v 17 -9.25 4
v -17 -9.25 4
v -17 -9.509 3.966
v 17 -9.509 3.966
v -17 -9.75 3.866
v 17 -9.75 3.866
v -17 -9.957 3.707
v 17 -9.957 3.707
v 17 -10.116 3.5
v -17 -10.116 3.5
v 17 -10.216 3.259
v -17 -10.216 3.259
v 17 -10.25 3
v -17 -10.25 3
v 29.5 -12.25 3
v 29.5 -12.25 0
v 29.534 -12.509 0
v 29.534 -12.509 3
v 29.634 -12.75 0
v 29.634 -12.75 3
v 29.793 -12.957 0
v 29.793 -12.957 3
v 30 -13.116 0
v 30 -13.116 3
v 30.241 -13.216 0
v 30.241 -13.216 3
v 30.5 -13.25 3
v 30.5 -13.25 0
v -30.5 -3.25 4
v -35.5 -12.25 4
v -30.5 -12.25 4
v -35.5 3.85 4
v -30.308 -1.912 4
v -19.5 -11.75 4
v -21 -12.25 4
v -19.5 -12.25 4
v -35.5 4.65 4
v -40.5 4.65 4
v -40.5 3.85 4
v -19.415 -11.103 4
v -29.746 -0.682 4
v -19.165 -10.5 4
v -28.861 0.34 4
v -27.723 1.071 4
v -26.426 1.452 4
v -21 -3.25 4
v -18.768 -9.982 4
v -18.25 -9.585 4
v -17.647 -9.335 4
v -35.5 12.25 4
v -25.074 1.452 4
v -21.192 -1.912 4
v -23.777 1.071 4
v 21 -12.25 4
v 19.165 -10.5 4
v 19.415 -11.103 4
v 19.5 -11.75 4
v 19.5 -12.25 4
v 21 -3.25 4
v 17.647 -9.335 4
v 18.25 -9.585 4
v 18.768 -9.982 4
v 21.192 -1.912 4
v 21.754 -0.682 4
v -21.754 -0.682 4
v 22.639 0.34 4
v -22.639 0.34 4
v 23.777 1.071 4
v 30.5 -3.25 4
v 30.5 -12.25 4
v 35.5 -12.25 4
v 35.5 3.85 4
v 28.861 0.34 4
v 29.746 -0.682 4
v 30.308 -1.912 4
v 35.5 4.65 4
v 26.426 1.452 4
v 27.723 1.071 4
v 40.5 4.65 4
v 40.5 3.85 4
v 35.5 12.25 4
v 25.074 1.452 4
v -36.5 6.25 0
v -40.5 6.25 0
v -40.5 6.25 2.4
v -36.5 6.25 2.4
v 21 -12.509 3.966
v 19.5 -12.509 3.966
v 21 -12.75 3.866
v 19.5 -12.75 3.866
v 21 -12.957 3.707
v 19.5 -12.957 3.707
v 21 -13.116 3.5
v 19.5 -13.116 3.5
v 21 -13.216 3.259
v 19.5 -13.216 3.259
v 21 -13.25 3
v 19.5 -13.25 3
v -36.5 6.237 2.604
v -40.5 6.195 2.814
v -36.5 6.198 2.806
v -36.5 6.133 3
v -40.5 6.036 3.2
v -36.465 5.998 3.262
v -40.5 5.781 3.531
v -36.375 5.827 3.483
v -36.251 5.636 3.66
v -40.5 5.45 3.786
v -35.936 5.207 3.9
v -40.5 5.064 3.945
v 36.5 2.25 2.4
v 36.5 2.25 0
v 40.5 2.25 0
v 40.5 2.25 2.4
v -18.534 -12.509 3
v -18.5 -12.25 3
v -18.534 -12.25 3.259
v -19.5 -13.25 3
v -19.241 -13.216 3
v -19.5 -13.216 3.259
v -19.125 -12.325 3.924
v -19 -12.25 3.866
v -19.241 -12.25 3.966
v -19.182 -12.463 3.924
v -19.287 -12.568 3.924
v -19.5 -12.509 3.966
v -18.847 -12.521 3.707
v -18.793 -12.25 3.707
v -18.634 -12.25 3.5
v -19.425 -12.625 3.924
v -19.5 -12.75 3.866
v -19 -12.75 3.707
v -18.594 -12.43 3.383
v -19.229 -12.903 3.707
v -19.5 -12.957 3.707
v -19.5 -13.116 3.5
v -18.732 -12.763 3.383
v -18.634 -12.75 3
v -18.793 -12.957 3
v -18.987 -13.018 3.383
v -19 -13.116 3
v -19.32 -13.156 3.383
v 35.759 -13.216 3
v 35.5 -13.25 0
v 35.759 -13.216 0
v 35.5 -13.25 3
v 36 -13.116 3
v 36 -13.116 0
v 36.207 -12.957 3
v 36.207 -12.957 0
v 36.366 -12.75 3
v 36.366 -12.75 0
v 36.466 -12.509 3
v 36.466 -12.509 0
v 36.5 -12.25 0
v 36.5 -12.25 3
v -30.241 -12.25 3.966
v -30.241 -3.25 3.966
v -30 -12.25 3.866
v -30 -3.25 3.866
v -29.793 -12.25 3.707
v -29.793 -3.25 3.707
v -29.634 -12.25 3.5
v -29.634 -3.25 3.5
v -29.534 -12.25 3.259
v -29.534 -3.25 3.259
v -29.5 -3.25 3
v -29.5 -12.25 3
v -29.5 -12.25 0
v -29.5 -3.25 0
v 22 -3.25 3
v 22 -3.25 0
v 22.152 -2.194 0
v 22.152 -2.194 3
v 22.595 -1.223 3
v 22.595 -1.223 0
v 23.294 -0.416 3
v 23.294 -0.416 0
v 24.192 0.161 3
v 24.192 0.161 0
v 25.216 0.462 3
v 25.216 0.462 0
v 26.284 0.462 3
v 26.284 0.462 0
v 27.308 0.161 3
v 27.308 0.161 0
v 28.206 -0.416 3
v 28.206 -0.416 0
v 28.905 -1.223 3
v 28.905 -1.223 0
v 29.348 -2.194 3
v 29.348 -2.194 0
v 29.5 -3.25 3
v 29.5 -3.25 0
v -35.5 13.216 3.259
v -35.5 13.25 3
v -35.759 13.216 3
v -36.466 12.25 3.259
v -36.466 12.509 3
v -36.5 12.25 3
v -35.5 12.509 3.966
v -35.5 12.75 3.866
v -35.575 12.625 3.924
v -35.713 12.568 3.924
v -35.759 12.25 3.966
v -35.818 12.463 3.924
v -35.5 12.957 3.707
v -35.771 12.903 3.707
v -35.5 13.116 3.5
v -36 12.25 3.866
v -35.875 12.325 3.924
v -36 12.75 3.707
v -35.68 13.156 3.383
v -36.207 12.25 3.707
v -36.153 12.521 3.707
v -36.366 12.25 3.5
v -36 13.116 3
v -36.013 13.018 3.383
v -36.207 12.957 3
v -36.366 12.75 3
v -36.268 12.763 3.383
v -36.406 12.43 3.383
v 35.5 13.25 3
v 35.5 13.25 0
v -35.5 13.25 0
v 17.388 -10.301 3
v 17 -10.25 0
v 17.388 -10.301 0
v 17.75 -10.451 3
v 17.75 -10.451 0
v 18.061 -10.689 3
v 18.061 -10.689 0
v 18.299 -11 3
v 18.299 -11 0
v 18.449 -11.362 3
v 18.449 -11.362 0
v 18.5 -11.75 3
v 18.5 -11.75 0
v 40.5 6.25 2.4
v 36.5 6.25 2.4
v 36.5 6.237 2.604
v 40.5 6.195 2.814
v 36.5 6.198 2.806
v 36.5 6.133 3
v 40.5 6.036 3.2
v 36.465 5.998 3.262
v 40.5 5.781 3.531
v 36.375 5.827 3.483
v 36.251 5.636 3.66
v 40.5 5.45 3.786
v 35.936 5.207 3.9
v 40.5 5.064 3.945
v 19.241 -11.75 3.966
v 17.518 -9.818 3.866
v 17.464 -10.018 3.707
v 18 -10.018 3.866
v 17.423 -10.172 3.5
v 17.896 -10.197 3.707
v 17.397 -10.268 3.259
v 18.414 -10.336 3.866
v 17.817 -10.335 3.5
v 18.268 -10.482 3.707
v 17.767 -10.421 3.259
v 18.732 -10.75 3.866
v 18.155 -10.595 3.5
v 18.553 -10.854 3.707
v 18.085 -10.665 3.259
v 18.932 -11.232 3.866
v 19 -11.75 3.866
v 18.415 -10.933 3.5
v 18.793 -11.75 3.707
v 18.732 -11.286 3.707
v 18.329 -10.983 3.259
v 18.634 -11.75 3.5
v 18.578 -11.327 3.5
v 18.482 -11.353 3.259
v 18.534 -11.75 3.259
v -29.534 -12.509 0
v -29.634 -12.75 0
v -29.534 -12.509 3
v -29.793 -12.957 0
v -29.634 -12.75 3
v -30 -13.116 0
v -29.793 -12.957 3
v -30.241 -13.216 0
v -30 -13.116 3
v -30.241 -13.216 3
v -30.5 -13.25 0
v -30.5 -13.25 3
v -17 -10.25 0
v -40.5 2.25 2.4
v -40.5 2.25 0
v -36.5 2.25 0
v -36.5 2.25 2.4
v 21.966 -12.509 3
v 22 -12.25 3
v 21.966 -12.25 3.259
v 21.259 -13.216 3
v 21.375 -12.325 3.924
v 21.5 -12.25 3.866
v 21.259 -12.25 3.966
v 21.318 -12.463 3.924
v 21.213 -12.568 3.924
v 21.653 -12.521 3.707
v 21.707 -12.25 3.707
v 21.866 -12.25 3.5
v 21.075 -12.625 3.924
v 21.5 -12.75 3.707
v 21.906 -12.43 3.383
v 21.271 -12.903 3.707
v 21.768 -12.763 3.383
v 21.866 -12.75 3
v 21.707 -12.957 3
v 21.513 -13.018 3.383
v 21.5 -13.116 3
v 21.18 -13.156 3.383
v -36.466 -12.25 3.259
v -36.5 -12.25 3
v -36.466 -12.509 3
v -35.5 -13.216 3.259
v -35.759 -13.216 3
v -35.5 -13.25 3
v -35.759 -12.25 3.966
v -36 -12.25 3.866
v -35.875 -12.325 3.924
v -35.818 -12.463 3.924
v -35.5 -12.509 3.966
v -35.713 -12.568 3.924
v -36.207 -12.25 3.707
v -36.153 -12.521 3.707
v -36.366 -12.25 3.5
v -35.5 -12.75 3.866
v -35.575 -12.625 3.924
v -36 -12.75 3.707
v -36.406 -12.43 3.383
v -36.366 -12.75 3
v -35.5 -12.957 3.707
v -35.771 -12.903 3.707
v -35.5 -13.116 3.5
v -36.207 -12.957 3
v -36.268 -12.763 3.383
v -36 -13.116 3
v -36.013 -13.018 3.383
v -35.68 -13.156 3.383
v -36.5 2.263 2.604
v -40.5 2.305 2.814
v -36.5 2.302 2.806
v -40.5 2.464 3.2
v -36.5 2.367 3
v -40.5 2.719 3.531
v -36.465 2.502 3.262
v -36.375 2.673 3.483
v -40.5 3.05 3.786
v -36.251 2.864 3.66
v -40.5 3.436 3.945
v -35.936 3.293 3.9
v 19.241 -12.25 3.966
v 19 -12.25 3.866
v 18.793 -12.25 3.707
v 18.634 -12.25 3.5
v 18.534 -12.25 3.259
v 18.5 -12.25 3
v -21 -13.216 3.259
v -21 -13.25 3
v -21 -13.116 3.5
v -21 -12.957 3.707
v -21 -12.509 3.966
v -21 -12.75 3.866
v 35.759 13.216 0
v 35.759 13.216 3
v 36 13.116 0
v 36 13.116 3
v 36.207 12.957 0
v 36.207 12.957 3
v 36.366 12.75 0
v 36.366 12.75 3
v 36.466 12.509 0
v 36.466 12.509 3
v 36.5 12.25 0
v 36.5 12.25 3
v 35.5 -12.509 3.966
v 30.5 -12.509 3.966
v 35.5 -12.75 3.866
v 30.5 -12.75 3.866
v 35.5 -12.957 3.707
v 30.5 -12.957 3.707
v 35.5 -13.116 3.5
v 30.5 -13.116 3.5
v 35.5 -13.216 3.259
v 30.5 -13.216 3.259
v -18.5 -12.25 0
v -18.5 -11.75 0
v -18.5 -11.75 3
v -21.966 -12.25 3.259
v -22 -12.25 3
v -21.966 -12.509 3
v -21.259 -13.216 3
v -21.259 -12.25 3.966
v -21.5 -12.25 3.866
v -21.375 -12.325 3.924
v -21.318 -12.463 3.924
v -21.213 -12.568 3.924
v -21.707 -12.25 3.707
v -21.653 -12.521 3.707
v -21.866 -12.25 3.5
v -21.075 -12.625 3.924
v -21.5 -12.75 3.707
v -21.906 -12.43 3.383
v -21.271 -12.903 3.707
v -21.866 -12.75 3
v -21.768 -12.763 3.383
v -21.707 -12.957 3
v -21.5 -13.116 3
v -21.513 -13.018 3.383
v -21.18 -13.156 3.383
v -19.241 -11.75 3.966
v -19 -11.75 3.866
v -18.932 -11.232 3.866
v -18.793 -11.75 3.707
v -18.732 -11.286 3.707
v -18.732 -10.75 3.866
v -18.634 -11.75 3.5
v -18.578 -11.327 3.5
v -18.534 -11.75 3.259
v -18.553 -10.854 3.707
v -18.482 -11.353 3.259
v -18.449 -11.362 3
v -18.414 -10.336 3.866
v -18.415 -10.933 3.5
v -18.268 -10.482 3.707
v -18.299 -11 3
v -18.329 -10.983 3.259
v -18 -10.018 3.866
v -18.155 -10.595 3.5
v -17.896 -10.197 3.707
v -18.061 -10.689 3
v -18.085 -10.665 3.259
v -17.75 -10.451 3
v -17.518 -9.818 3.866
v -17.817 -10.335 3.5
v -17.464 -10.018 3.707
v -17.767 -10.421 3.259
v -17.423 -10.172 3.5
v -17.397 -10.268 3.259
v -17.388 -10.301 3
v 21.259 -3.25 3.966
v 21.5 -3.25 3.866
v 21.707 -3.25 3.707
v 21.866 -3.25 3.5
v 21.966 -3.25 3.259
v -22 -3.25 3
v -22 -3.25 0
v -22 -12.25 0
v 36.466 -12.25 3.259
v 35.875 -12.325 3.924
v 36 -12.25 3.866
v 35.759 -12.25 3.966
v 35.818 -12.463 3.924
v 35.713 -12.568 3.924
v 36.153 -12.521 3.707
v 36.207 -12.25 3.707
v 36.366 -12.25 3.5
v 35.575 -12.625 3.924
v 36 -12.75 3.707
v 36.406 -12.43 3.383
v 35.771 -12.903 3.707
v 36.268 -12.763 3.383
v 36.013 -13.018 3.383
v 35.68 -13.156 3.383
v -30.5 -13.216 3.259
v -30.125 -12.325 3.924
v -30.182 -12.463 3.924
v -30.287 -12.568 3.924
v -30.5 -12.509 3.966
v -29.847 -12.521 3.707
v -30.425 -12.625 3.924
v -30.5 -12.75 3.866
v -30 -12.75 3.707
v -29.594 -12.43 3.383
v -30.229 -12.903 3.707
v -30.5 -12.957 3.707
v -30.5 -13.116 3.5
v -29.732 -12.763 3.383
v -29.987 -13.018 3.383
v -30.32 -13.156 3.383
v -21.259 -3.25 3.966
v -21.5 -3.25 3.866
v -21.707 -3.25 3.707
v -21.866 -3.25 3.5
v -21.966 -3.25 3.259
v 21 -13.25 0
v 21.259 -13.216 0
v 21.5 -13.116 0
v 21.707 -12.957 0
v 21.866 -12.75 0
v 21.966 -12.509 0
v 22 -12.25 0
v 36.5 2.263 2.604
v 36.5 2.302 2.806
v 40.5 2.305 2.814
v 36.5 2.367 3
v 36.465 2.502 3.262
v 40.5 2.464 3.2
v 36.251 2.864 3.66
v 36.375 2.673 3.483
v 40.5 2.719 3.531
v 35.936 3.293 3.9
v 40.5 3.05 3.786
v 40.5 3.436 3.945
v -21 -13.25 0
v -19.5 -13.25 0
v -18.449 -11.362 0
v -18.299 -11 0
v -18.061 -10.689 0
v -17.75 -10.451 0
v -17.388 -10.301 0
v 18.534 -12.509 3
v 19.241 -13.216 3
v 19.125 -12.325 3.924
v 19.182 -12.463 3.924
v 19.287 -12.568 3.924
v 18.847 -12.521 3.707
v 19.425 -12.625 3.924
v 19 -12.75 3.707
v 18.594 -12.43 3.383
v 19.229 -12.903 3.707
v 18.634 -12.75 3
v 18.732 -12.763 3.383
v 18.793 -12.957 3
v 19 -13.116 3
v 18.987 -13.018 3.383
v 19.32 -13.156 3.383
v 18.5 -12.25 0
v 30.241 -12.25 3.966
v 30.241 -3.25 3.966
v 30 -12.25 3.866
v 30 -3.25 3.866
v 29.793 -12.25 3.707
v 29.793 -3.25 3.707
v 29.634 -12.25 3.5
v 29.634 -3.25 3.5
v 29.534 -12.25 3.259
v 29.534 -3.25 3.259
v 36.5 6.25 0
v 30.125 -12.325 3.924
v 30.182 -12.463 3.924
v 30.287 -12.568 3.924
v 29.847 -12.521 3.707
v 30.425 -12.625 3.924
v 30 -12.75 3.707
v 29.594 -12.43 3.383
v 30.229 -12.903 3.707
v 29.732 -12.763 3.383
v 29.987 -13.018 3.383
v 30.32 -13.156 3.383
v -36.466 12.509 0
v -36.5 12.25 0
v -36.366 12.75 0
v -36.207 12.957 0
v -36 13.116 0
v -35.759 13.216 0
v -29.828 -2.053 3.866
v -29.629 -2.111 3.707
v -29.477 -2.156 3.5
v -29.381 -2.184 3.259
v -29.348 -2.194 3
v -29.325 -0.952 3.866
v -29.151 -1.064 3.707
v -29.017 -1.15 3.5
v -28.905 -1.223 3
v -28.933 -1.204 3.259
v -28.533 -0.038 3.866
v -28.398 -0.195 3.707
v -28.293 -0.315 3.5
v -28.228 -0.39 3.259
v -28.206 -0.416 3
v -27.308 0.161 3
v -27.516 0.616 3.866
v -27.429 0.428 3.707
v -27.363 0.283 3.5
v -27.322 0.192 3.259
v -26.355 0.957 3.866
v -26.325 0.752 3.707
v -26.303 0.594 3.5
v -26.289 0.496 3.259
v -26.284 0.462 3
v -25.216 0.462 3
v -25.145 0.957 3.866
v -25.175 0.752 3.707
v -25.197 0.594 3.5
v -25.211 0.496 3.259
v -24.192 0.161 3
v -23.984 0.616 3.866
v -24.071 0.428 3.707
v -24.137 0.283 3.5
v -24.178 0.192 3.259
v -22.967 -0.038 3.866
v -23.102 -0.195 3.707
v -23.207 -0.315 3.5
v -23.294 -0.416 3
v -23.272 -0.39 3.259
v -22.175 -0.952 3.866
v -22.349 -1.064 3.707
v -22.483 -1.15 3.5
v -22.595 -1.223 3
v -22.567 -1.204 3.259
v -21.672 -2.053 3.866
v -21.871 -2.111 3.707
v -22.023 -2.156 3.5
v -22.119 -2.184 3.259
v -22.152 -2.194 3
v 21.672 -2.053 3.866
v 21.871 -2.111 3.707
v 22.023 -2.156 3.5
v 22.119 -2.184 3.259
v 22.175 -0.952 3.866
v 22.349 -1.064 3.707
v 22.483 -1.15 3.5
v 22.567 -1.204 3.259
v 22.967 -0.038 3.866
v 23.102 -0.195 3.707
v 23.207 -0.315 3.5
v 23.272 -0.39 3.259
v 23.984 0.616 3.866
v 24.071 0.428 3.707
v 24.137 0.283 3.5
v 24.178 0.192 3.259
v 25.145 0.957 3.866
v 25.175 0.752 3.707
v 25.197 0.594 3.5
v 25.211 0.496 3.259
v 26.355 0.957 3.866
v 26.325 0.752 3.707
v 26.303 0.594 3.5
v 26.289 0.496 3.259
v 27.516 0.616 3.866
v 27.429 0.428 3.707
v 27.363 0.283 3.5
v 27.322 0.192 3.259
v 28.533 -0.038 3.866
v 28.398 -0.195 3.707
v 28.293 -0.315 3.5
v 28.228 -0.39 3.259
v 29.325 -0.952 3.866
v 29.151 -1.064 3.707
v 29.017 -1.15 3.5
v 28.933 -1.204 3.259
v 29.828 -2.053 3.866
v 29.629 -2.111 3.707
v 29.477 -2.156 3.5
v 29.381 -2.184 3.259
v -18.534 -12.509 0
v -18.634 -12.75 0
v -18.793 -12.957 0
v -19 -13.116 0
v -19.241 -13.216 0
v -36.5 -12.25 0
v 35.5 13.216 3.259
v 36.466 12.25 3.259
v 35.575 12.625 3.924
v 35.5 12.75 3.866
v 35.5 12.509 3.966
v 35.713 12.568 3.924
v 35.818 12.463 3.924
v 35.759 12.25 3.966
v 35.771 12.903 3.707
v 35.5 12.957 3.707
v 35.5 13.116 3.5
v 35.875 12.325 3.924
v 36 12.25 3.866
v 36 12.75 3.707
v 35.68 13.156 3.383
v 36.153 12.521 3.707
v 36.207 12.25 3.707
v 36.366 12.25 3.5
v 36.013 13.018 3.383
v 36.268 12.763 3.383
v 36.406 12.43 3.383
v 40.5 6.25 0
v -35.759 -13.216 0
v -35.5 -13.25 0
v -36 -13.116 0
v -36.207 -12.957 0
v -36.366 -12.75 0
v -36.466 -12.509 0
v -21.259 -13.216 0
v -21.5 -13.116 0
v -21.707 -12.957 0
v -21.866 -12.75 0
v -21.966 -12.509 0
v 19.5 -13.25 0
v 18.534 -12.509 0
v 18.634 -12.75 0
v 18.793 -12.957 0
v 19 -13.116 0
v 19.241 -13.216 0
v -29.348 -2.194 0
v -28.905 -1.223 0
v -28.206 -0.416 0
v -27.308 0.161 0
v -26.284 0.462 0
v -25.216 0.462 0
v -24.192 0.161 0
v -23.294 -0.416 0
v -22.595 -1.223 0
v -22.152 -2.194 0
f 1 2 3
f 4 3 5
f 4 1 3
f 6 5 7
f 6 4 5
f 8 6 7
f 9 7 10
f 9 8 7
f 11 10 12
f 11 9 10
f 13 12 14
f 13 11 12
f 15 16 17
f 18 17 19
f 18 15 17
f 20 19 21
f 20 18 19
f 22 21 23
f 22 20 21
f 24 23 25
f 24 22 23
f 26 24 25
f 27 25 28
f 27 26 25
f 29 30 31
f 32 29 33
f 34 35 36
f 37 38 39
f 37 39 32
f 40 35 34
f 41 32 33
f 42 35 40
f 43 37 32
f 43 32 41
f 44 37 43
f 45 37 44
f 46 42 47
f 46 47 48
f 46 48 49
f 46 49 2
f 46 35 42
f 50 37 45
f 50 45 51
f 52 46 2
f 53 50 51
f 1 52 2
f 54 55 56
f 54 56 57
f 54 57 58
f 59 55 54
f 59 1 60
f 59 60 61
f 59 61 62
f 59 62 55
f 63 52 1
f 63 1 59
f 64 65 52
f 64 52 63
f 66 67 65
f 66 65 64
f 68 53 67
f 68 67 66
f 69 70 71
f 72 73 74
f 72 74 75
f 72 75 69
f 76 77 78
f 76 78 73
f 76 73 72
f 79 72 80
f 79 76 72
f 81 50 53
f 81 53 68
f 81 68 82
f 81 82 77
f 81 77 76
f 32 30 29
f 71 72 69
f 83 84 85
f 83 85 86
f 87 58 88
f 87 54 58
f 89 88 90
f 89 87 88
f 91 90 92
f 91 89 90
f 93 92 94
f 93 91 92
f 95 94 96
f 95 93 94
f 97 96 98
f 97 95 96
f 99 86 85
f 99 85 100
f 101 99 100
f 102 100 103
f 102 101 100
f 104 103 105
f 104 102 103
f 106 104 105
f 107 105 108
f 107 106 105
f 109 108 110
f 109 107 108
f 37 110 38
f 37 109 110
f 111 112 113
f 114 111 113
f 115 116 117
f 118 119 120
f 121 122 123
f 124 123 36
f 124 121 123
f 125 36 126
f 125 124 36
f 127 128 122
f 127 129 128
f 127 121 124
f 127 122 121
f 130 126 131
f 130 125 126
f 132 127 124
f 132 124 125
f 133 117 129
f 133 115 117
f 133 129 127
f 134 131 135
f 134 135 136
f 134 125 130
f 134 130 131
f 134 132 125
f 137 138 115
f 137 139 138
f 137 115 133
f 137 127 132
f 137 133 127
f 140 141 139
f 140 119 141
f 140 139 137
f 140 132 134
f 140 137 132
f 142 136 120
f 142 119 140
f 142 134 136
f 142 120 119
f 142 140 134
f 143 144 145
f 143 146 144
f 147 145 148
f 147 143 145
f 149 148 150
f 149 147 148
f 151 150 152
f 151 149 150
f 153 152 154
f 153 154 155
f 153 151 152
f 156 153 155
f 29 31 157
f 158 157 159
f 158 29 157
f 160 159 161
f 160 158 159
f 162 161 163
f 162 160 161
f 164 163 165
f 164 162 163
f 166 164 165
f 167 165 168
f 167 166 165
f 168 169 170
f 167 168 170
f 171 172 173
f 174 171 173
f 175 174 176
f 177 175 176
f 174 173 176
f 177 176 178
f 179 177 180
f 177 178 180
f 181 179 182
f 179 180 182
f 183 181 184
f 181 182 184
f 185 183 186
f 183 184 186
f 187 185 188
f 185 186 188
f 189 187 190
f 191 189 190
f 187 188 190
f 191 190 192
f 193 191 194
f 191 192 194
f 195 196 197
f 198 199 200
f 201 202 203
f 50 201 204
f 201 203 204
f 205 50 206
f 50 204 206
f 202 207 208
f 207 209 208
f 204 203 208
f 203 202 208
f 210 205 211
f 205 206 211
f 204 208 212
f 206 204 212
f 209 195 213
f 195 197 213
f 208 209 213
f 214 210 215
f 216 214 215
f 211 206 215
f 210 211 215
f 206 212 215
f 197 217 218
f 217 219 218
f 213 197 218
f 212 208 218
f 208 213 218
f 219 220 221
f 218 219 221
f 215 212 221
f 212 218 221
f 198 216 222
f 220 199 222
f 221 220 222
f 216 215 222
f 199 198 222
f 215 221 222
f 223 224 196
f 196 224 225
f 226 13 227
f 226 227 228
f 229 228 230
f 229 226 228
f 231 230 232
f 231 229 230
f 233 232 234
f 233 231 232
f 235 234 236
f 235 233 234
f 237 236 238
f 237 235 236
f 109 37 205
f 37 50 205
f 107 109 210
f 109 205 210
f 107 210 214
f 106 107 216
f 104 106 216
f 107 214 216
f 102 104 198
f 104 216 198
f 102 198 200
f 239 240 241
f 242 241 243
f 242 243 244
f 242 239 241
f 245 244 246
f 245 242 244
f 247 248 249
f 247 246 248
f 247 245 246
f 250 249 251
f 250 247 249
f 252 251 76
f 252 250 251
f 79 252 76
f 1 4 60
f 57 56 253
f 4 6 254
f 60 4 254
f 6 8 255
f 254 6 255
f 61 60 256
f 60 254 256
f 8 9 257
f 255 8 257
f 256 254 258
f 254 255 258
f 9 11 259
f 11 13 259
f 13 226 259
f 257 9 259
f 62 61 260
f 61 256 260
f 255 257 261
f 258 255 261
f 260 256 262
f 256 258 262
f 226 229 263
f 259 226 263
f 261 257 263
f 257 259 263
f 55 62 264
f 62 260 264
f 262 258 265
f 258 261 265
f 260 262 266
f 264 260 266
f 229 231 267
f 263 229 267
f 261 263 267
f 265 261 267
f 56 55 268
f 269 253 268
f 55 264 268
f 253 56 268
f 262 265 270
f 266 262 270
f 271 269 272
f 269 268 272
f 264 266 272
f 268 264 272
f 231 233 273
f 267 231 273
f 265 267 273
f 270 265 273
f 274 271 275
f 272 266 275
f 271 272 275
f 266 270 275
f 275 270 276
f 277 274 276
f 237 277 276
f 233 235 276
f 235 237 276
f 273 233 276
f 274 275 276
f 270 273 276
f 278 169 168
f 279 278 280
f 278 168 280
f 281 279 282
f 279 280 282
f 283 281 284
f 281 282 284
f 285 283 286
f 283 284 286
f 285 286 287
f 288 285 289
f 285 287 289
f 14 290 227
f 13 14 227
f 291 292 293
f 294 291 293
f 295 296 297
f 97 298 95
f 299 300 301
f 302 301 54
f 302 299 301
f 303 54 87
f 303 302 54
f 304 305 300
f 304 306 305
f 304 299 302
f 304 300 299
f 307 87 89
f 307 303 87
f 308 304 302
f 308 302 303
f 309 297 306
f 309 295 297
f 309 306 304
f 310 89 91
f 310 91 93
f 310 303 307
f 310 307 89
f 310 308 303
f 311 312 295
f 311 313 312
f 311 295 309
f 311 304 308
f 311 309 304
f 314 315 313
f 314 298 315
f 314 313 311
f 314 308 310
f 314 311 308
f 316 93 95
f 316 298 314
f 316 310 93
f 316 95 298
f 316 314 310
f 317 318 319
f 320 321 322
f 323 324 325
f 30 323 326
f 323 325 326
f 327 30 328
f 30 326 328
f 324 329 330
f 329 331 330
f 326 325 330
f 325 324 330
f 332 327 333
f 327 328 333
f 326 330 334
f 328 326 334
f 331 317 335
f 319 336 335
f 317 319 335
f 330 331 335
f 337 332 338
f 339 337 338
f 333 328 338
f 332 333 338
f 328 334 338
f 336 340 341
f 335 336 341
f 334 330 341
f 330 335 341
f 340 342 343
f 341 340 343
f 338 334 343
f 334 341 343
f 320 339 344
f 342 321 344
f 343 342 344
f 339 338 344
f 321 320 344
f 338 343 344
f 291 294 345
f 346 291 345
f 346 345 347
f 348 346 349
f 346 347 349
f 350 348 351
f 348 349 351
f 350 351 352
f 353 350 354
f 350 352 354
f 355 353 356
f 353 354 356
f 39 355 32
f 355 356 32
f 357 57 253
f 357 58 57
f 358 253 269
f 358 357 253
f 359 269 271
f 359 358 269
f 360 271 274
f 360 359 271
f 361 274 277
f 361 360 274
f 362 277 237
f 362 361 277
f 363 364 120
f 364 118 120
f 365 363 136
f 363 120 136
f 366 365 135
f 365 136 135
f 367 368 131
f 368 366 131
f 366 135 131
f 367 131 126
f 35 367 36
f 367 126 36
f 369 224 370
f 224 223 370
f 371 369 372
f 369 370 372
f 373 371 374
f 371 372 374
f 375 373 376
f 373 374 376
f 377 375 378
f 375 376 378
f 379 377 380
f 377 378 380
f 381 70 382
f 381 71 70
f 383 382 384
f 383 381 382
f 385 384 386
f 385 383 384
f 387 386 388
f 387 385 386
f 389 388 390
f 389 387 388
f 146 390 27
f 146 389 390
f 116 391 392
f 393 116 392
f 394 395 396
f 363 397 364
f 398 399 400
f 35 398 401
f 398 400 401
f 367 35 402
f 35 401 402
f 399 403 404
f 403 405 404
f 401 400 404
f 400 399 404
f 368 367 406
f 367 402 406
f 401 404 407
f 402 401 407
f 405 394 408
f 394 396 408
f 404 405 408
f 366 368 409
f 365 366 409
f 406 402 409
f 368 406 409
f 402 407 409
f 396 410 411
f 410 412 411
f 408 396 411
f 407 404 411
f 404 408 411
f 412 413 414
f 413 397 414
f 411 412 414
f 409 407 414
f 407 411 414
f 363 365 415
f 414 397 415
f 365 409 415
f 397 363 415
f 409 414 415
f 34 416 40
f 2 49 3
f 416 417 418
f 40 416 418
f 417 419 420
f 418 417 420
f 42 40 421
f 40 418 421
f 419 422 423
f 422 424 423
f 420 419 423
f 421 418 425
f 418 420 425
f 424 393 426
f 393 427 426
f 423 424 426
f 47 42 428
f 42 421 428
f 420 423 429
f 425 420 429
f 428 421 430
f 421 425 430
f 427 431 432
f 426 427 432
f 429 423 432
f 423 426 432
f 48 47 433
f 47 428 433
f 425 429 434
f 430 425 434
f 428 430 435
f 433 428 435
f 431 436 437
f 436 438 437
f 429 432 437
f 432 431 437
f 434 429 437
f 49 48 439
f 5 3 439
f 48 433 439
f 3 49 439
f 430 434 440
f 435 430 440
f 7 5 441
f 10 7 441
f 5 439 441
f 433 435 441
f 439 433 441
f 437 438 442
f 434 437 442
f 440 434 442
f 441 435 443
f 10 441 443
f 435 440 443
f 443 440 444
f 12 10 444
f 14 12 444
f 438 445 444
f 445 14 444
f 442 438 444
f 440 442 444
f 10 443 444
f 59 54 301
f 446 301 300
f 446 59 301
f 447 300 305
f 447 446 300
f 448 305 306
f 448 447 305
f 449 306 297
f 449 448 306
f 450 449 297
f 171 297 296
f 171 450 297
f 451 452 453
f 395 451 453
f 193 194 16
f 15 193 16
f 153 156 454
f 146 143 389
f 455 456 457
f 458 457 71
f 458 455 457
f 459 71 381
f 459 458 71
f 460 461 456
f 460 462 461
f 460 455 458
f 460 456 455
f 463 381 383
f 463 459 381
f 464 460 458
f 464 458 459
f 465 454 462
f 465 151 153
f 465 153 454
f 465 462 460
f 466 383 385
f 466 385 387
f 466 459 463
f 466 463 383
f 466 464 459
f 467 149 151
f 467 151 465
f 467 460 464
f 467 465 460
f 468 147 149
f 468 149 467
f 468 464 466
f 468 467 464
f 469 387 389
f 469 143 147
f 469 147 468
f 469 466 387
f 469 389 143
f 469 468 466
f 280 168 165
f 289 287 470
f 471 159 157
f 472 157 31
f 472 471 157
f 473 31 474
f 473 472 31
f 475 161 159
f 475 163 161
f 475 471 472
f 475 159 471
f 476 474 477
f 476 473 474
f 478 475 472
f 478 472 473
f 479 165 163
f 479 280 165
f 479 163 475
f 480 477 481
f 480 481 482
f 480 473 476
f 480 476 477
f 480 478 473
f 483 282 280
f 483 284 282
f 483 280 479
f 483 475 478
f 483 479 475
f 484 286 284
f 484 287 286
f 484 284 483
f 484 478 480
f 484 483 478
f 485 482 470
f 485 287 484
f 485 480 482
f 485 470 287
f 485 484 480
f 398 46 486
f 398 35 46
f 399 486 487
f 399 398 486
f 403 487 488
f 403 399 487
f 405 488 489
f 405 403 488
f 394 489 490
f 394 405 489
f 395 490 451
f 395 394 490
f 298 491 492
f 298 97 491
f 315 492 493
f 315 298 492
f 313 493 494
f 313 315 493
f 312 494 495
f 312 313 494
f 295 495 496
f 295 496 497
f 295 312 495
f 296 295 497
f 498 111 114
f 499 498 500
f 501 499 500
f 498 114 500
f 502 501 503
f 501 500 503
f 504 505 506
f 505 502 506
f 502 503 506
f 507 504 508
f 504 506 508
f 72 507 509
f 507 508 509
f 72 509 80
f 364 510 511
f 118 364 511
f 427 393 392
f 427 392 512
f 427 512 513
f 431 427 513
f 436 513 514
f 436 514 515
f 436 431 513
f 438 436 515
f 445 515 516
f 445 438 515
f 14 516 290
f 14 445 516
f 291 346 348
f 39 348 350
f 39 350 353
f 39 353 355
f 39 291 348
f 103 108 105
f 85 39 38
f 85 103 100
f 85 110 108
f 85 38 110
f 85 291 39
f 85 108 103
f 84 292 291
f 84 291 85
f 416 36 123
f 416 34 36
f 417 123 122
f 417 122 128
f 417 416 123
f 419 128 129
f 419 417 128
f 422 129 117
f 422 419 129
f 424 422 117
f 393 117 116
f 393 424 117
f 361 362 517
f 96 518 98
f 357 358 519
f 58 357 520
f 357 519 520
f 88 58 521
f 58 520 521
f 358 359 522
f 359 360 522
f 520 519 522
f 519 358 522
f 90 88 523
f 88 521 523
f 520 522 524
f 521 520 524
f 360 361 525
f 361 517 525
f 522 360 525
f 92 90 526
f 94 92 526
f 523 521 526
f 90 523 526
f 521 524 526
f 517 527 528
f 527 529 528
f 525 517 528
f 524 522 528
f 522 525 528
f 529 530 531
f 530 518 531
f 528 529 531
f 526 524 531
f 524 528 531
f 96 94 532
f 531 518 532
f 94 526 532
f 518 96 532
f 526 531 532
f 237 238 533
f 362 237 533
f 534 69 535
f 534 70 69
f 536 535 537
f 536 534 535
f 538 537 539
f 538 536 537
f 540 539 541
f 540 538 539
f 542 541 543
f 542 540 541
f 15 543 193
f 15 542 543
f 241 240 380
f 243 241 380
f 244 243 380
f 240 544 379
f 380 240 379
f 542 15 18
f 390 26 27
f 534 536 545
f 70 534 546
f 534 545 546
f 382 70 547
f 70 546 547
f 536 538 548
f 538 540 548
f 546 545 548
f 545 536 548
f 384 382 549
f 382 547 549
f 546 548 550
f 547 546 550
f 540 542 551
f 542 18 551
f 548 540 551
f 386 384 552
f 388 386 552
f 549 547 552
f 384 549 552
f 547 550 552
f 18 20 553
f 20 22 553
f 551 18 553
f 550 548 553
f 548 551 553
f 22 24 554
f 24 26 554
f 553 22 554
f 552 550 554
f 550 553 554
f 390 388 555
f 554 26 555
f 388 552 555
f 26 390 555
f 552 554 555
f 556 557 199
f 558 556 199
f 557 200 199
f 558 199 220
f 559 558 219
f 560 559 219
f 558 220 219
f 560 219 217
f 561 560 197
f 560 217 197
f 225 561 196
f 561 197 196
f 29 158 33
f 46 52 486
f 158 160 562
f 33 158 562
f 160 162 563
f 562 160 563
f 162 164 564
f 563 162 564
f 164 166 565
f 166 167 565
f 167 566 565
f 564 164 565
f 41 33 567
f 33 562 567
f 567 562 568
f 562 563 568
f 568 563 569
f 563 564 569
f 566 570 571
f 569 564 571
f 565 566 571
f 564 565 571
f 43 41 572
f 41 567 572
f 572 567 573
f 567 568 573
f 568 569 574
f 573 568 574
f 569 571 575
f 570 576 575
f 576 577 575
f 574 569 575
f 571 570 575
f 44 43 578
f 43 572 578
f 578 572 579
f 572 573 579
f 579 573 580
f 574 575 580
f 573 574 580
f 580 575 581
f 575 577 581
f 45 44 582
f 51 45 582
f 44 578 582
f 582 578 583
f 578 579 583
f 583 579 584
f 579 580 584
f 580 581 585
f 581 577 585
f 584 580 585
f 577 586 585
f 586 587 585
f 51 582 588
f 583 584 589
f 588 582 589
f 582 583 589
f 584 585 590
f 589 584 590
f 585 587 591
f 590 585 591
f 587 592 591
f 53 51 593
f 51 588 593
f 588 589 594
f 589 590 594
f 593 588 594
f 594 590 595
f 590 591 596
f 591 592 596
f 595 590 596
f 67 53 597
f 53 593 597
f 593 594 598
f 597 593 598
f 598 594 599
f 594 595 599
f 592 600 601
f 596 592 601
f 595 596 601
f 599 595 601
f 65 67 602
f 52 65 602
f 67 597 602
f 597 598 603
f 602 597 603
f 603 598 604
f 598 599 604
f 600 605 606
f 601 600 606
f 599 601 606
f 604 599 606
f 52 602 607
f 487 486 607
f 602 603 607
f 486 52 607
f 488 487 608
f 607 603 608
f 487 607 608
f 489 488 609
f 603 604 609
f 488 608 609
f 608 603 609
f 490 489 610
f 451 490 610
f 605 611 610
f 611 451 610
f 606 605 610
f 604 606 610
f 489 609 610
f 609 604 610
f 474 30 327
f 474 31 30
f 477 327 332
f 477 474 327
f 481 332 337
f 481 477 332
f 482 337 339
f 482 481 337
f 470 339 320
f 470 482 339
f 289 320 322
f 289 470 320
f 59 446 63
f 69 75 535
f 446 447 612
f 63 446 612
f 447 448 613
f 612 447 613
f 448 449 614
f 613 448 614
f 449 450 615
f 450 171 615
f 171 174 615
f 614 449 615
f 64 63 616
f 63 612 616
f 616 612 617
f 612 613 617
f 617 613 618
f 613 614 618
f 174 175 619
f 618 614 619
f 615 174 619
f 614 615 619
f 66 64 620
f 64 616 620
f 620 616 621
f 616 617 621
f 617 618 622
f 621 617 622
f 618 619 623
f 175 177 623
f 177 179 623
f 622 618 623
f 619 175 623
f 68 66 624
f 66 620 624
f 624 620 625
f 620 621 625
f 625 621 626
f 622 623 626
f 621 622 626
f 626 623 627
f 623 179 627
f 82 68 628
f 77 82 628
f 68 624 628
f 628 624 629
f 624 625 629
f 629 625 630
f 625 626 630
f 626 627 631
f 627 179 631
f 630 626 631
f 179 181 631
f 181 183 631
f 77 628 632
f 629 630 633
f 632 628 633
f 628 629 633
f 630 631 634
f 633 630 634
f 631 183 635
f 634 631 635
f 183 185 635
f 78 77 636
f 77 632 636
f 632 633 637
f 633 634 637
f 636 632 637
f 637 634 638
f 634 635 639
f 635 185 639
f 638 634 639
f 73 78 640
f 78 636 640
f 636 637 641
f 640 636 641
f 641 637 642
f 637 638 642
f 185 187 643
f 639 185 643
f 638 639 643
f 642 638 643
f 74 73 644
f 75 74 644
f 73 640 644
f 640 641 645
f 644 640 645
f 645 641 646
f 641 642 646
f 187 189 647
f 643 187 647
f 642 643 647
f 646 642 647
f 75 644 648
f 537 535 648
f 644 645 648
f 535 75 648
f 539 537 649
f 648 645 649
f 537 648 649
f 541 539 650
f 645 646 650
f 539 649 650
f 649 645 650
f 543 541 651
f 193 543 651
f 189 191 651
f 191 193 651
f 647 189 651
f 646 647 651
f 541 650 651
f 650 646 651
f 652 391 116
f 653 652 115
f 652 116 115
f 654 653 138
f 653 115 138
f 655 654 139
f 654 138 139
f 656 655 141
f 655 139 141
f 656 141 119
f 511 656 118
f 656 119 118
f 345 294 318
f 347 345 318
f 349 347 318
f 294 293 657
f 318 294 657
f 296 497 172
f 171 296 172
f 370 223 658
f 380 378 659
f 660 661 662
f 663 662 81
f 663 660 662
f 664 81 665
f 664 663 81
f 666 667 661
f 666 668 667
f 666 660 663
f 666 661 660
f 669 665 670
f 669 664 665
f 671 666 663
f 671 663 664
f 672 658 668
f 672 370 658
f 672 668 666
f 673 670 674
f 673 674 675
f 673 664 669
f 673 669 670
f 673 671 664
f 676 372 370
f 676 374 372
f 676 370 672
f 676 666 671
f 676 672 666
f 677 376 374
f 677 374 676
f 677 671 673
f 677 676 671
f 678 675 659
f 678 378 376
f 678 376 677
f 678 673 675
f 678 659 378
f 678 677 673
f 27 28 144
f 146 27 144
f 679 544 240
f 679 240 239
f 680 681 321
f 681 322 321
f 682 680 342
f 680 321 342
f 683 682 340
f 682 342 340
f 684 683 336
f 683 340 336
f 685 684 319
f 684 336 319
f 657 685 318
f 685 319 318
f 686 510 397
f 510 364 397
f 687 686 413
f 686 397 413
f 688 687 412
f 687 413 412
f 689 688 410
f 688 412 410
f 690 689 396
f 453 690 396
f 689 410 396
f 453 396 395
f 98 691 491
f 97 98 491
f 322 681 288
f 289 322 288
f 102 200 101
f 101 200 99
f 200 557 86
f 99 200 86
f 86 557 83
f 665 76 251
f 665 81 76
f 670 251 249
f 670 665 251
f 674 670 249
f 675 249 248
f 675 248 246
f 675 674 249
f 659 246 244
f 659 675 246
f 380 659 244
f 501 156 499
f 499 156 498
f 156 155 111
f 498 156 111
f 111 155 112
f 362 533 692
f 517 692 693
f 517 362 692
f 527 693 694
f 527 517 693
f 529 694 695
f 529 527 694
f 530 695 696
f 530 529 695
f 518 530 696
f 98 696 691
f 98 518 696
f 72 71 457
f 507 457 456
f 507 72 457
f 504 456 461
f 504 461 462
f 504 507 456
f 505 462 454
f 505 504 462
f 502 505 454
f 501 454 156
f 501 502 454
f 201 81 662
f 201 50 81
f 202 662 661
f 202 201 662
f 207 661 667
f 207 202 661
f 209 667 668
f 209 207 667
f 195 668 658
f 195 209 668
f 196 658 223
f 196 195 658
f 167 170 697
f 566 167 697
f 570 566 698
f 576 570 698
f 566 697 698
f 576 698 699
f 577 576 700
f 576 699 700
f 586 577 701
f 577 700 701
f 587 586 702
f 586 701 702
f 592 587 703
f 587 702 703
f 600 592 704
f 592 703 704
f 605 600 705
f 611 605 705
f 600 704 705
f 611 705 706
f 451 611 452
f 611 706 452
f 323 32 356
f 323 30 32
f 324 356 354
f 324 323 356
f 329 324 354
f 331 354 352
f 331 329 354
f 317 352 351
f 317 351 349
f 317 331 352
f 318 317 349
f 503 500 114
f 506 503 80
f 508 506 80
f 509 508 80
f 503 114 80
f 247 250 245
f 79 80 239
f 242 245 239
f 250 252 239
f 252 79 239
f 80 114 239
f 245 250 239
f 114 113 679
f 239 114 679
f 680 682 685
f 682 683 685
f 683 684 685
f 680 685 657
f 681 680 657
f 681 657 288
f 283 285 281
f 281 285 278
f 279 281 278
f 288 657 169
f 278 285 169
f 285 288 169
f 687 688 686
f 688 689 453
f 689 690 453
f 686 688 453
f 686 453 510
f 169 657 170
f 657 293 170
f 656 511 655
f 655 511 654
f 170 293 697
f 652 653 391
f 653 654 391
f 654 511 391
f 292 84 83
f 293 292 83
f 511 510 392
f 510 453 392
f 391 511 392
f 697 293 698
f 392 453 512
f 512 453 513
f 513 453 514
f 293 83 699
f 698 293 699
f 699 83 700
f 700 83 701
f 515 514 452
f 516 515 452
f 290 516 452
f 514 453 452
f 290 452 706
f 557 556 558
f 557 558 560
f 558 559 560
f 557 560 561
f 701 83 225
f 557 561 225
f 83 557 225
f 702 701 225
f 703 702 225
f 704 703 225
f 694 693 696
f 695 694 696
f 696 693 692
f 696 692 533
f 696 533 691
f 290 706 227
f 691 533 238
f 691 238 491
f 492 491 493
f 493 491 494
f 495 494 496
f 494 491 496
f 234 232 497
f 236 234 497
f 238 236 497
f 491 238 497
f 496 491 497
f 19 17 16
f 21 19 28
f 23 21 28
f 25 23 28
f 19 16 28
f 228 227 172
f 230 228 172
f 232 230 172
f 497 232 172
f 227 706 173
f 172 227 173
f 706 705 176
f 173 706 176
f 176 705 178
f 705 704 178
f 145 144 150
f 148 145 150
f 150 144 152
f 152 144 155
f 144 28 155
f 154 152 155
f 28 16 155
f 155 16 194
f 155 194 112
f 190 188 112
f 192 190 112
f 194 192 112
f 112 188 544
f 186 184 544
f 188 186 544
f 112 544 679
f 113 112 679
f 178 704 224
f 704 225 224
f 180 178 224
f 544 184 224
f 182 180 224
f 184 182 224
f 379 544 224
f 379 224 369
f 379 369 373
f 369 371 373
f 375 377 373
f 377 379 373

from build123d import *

# Parameters (mm, degrees)
F0_W     = 4
F0_H     = 4
F1_DEPTH = 4
F2_R     = 1.6
F3_R     = 1.5
F4_R     = 1


with BuildPart() as f1:
    # F0 (on Top) → F1 (new body)
    with BuildSketch(Plane.XY):
        with BuildLine():
            Line((36.5, 6.25), (36.5, 13.25))
            Line((36.5, 13.25), (-36.5, 13.25))
            Line((-36.5, 13.25), (-36.5, 6.25))
            Line((-36.5, 6.25), (-36.5, 2.25))
            Line((-36.5, 2.25), (-36.5, -13.25))
            Line((-36.5, -13.25), (-29.5, -13.25))
            Line((-29.5, -13.25), (-29.5, -3.25))
            ThreePointArc((-29.5, -3.25), (-25.75, 0.5), (-22, -3.25))
            Line((-22, -3.25), (-22, -13.25))
            Line((-22, -13.25), (-18.5, -13.25))
            Line((-18.5, -13.25), (-18.5, -10.25))
            Line((-18.5, -10.25), (18.5, -10.25))
            Line((18.5, -10.25), (18.5, -13.25))
            Line((18.5, -13.25), (22, -13.25))
            Line((22, -13.25), (22, -3.25))
            ThreePointArc((22, -3.25), (25.75, 0.5), (29.5, -3.25))
            Line((29.5, -3.25), (29.5, -13.25))
            Line((29.5, -13.25), (36.5, -13.25))
            Line((36.5, -13.25), (36.5, 2.25))
            Line((36.5, 2.25), (36.5, 6.25))
        make_face()
        with Locations((-38.5, 4.25)):
            Rectangle(F0_W, F0_H)
        with Locations((38.5, 4.25)):
            Rectangle(F0_W, F0_H)
    extrude(amount=F1_DEPTH)

    # F2
    f2_edges = [f1.edges().sort_by_distance(p)[0] for p in [
        (38.5, 6.25, 4),
        (38.5, 2.25, 4),
        (-38.5, 2.25, 4),
        (-38.5, 6.25, 4),
    ]]
    fillet(f2_edges, radius=F2_R)

    # F3
    f3_edges = [f1.edges().sort_by_distance(p)[0] for p in [
        (-18.5, -10.25, 2),
        (18.5, -10.25, 2),
    ]]
    fillet(f3_edges, radius=F3_R)

    # F4
    f4_edges = [f1.edges().sort_by_distance(p)[0] for p in [
        (-36.5, -13.25, 2),
        (-29.5, -13.25, 2),
        (-22, -13.25, 2),
        (-18.5, -13.25, 2),
        (18.5, -13.25, 2),
        (22, -13.25, 2),
        (29.5, -13.25, 2),
        (36.5, -13.25, 2),
        (-36.5, 13.25, 2),
        (36.5, 13.25, 2),
        (36.5, -5.5, 4),
        (0, 13.25, 4),
        (36.5, 9.75, 4),
        (-36.5, 9.75, 4),
        (-36.5, -5.5, 4),
        (-22, -8.25, 4),
        (22, -8.25, 4),
        (0, -10.25, 4),
        (-33, -13.25, 4),
        (33, -13.25, 4),
        (20.25, -13.25, 4),
        (-20.25, -13.25, 4),
    ]]
    fillet(f4_edges, radius=F4_R)


solid = f1.part
